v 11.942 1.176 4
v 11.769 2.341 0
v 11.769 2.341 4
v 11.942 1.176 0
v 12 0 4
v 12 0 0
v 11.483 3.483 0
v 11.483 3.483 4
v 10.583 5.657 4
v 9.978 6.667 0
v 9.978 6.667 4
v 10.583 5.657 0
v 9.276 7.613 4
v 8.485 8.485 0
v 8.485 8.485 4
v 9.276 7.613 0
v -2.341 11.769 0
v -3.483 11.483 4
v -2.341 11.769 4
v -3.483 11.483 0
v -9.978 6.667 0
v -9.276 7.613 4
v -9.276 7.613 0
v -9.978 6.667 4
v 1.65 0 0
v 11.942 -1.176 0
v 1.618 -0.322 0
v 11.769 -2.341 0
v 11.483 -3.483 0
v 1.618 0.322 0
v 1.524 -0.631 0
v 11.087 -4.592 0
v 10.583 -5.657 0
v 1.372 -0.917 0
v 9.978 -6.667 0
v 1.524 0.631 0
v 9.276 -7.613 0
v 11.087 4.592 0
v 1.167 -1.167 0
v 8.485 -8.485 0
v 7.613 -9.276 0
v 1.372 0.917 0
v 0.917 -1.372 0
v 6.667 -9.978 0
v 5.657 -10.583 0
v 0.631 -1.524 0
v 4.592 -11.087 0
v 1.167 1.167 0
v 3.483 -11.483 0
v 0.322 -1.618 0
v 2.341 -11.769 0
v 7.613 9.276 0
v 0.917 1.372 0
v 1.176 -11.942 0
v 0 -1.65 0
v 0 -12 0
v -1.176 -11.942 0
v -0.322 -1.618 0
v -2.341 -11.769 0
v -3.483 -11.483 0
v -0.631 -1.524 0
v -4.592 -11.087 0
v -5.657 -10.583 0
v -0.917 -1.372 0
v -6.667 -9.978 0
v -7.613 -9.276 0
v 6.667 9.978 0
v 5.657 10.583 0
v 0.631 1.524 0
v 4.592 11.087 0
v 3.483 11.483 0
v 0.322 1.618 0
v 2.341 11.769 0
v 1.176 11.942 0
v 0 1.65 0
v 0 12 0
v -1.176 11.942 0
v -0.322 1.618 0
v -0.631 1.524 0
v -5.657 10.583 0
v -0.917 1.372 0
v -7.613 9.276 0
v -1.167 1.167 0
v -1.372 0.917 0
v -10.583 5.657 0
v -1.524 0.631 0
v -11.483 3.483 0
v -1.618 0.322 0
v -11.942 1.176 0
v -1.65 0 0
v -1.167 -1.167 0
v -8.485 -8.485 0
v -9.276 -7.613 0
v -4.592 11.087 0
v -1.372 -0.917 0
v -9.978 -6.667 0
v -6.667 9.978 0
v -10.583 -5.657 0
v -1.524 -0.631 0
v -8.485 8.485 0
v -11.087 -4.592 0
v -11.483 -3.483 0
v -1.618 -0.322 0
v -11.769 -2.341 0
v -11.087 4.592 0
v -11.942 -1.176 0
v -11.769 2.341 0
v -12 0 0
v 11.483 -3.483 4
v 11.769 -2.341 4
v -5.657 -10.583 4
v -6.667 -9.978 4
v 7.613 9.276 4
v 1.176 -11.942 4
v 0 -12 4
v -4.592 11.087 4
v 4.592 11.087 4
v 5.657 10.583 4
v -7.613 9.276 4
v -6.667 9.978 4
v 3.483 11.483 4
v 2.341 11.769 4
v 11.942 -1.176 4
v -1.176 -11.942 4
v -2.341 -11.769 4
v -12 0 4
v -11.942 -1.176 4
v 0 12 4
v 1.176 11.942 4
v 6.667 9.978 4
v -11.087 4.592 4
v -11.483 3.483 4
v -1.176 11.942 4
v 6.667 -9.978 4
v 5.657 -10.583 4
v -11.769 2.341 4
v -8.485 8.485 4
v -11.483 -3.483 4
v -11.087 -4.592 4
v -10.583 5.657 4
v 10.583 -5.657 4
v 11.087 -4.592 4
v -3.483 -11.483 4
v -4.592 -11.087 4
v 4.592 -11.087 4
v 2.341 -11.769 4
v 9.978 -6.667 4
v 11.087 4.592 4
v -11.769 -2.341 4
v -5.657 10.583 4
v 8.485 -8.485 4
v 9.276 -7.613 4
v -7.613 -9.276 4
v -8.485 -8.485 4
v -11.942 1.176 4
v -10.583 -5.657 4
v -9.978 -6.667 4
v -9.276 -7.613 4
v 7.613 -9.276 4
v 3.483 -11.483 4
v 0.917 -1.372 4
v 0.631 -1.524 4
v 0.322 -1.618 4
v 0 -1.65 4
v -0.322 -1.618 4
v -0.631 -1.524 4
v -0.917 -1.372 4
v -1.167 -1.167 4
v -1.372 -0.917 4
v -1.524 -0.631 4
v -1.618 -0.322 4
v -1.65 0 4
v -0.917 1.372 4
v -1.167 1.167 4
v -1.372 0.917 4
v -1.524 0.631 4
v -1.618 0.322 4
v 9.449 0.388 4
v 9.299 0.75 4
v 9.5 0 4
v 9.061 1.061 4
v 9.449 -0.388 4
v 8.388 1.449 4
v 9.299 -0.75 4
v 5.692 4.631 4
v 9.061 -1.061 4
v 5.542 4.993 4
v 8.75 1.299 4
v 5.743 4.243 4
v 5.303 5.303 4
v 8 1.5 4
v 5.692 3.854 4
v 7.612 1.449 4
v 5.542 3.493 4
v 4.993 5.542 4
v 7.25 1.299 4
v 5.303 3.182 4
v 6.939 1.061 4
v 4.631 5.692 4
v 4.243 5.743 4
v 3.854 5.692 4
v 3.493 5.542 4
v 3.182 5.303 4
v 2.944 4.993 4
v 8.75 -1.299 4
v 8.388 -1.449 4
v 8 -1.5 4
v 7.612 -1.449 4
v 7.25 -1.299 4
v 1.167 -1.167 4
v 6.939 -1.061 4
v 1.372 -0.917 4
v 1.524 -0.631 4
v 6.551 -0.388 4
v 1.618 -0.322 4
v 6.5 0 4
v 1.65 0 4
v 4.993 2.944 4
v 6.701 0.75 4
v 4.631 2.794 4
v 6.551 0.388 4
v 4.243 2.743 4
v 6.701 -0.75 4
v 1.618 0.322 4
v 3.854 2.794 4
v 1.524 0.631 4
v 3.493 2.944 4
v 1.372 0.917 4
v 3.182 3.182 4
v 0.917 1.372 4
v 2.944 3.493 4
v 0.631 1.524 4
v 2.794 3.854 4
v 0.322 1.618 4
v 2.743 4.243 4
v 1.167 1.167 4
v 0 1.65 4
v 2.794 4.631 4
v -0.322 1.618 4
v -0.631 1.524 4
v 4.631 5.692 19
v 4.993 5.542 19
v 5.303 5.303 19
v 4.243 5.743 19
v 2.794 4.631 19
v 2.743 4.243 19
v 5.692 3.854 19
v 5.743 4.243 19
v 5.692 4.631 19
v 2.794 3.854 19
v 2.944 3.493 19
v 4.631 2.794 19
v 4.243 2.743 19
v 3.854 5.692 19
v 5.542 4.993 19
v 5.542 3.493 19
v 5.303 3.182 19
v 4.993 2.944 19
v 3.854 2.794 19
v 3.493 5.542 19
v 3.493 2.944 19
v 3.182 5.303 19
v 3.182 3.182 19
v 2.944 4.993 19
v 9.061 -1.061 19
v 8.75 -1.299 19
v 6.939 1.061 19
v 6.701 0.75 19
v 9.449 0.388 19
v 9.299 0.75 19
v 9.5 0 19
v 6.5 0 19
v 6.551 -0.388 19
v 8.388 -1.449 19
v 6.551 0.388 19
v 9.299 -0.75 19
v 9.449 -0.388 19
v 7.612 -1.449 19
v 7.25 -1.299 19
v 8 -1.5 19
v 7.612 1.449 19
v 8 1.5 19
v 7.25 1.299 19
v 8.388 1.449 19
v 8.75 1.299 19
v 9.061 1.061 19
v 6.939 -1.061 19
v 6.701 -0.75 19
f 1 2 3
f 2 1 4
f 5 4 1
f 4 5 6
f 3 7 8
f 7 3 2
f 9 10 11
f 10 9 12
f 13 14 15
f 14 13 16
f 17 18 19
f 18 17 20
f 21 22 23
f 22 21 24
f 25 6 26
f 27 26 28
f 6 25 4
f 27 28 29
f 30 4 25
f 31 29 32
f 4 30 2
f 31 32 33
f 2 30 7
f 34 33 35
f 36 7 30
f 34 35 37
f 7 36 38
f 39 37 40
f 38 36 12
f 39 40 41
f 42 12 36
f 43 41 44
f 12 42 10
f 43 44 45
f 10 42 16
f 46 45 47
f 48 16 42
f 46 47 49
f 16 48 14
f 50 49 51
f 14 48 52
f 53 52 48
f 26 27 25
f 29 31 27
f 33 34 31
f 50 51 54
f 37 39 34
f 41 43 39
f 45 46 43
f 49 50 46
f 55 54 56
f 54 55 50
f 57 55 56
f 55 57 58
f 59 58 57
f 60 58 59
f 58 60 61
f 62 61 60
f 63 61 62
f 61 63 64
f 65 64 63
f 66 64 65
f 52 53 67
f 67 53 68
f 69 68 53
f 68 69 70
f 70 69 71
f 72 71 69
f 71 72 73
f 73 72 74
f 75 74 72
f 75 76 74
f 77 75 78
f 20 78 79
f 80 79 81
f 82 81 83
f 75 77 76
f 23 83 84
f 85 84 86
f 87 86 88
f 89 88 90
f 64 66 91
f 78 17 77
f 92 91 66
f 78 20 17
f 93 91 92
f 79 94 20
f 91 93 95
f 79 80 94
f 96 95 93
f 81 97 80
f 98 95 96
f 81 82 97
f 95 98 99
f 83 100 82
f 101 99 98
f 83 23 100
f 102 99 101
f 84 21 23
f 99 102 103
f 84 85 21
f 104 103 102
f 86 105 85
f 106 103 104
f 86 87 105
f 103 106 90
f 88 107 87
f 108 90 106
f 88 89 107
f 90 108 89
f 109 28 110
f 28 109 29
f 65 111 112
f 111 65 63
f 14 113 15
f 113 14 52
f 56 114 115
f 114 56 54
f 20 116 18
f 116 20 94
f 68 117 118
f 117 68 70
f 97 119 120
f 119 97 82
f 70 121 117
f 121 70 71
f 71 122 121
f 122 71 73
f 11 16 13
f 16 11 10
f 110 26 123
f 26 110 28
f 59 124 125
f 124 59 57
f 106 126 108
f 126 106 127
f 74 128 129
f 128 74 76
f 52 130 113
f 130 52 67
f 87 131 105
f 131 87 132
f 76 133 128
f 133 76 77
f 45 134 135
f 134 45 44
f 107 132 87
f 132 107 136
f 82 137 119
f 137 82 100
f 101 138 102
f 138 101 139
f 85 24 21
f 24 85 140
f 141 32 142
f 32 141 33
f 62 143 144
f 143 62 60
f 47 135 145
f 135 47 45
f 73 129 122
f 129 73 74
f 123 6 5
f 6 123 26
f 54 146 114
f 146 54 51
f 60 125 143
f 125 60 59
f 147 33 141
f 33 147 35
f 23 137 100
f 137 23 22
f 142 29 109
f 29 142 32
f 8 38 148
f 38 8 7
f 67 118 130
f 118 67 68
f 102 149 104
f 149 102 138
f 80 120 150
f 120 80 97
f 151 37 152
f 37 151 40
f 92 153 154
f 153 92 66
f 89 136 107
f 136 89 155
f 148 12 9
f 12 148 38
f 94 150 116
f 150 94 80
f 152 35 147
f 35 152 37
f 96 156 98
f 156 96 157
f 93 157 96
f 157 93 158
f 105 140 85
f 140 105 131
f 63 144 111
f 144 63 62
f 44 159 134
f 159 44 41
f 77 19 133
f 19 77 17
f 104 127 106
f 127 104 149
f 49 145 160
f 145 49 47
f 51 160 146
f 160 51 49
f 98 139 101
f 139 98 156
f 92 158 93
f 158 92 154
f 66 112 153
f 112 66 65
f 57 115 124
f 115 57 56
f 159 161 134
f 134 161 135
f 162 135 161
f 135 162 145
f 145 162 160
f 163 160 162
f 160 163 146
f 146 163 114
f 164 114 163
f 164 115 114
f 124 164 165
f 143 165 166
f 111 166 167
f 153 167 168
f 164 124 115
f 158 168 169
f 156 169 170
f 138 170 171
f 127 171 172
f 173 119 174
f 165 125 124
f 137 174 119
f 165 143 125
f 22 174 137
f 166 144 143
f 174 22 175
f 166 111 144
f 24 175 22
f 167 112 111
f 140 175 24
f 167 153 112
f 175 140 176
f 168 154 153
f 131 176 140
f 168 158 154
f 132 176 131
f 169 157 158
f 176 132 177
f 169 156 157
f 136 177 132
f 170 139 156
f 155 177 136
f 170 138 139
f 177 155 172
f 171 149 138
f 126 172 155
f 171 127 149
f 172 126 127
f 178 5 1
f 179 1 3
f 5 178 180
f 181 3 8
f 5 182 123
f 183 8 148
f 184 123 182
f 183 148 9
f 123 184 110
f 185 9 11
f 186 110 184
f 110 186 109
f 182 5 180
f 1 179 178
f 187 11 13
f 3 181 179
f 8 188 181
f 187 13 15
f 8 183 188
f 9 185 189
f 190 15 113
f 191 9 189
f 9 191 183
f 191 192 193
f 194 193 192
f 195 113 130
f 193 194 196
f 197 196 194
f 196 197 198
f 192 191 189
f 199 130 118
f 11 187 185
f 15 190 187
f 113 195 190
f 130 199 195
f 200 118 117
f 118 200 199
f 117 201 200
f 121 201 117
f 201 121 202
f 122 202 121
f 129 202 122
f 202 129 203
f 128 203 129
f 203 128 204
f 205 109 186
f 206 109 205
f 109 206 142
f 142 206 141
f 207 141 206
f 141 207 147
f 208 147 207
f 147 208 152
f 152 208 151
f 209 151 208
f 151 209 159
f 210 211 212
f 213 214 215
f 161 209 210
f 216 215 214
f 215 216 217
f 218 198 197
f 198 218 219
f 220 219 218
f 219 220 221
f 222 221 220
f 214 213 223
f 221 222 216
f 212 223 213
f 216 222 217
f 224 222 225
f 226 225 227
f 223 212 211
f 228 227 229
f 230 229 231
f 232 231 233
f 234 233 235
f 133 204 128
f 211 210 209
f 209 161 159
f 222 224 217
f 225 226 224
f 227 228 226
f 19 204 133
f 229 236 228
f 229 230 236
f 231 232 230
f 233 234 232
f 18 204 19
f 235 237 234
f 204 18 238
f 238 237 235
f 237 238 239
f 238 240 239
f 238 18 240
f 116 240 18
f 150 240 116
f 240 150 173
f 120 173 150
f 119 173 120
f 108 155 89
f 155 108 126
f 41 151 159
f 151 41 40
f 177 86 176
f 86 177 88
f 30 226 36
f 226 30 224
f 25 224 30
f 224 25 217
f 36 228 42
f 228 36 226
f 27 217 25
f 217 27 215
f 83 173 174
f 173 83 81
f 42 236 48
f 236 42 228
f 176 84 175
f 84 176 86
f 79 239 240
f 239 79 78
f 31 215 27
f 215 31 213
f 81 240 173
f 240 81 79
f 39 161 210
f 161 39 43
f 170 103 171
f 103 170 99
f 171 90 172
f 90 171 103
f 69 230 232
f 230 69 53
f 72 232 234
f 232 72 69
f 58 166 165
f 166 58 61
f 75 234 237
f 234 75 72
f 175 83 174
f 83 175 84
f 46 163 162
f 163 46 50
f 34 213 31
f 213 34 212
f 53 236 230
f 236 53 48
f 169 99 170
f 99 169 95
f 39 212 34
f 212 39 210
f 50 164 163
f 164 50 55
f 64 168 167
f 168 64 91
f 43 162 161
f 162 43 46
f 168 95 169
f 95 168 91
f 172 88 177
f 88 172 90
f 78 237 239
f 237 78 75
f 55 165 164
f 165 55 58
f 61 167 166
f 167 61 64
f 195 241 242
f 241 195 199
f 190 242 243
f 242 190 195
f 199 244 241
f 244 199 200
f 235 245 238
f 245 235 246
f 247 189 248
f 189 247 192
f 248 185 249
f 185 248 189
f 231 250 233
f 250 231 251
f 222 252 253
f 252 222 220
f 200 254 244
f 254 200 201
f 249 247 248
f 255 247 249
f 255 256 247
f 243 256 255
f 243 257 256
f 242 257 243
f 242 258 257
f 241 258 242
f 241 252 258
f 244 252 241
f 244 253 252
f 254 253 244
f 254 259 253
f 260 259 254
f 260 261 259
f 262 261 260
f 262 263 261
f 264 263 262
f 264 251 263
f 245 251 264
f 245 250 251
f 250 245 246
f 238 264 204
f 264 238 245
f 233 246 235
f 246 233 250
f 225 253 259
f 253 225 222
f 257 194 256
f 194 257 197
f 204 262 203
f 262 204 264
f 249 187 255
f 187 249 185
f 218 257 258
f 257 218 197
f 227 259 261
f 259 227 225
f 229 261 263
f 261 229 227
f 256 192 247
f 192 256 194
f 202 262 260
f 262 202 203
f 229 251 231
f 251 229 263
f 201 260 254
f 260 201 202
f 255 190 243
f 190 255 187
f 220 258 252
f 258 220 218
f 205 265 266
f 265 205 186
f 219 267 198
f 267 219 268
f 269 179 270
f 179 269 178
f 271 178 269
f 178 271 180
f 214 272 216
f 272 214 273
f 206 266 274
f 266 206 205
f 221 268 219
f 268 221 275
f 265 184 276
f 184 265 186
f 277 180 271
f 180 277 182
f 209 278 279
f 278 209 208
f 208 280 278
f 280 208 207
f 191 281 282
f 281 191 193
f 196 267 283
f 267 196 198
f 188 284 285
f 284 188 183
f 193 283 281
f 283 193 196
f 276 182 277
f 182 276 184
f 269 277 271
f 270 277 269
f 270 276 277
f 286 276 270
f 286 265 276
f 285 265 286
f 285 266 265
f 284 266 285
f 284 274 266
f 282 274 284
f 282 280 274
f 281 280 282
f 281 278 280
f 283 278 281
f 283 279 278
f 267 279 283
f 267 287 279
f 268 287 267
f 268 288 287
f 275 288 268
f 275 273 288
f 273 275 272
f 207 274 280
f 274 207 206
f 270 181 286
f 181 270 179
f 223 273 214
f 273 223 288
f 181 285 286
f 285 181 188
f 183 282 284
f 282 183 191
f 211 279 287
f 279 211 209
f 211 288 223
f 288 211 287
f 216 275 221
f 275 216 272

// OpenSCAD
// DUAL ECCENTRIC DISC MODULE
// For Starry Night Wave Surge Mechanism
// Single disc with two offset pins driving Zone 2 and Zone 3
//
// Design: Eccentric + Connecting Rod (Modified Slider-Crank)
// Creates asymmetric "quick up, slow down" wave motion
//
// Seven Masters Validation:
//   Van Gogh: 7/10 - Natural ease-out, organic feel
//   Da Vinci: 8/10 - Pin joints only, minimal friction
//   Watt: 8/10 - Simple 2-part addition per zone
//   Archimedes: 9/10 - Negligible power increase

// === PARAMETERS ===

// Disc dimensions
DISC_DIAMETER = 24;        // mm - accommodates both pins
DISC_THICKNESS = 4;        // mm
CENTER_HOLE_DIA = 3.3;     // mm - fits Wave Drive shaft (3mm + clearance)

// Zone 2 eccentric pin (Mid Ocean - moderate surge)
ZONE2_ECCENTRIC_R = 6;     // mm - creates 12mm total stroke
ZONE2_PHASE = 45;          // degrees offset from Zone 3

// Zone 3 eccentric pin (Breaking Wave - dramatic surge)
ZONE3_ECCENTRIC_R = 8;     // mm - creates 16mm total stroke
ZONE3_PHASE = 0;           // degrees (reference)

// Pin dimensions (shared)
PIN_DIAMETER = 3;          // mm
PIN_HEIGHT = 15;           // mm - clears both connecting rods

// Colors (inherit from main file if available)
C_METAL = [0.7, 0.7, 0.75];
C_PIN = [0.6, 0.6, 0.65];

// === MODULE ===

module dual_eccentric_disc(theta=0) {
    // Single disc with two eccentric pins for Zone 2 and Zone 3
    // theta = input rotation angle (from gear_rot * 2)

    color(C_METAL) {
        difference() {
            // Base disc
            cylinder(d=DISC_DIAMETER, h=DISC_THICKNESS, $fn=64);

            // Center shaft hole
            translate([0, 0, -1])
                cylinder(d=CENTER_HOLE_DIA, h=DISC_THICKNESS+2, $fn=32);
        }

        // Zone 2 pin (6mm throw, 45 degree offset)
        rotate([0, 0, theta + ZONE2_PHASE])
            translate([ZONE2_ECCENTRIC_R, 0, DISC_THICKNESS])
                color(C_PIN)
                    cylinder(d=PIN_DIAMETER, h=PIN_HEIGHT, $fn=24);

        // Zone 3 pin (8mm throw, 0 degree reference)
        rotate([0, 0, theta + ZONE3_PHASE])
            translate([ZONE3_ECCENTRIC_R, 0, DISC_THICKNESS])
                color(C_PIN)
                    cylinder(d=PIN_DIAMETER, h=PIN_HEIGHT, $fn=24);
    }
}

// Single-pin version for testing or simpler configurations
module single_eccentric_disc(eccentric_r, phase=0, theta=0) {
    color(C_METAL) {
        difference() {
            cylinder(d=DISC_DIAMETER, h=DISC_THICKNESS, $fn=64);
            translate([0, 0, -1])
                cylinder(d=CENTER_HOLE_DIA, h=DISC_THICKNESS+2, $fn=32);
        }

        rotate([0, 0, theta + phase])
            translate([eccentric_r, 0, DISC_THICKNESS])
                color(C_PIN)
                    cylinder(d=PIN_DIAMETER, h=PIN_HEIGHT, $fn=24);
    }
}

// === TEST RENDER ===
// Uncomment to preview disc at various angles

// Test at theta = 0
dual_eccentric_disc(0);

// Test at theta = 90 (uncomment)
// translate([30, 0, 0]) dual_eccentric_disc(90);

// Test at theta = 180 (uncomment)
// translate([60, 0, 0]) dual_eccentric_disc(180);

// Test at theta = 270 (uncomment)
// translate([90, 0, 0]) dual_eccentric_disc(270);

// Animation test (uncomment for OpenSCAD animation)
// dual_eccentric_disc($t * 360);
